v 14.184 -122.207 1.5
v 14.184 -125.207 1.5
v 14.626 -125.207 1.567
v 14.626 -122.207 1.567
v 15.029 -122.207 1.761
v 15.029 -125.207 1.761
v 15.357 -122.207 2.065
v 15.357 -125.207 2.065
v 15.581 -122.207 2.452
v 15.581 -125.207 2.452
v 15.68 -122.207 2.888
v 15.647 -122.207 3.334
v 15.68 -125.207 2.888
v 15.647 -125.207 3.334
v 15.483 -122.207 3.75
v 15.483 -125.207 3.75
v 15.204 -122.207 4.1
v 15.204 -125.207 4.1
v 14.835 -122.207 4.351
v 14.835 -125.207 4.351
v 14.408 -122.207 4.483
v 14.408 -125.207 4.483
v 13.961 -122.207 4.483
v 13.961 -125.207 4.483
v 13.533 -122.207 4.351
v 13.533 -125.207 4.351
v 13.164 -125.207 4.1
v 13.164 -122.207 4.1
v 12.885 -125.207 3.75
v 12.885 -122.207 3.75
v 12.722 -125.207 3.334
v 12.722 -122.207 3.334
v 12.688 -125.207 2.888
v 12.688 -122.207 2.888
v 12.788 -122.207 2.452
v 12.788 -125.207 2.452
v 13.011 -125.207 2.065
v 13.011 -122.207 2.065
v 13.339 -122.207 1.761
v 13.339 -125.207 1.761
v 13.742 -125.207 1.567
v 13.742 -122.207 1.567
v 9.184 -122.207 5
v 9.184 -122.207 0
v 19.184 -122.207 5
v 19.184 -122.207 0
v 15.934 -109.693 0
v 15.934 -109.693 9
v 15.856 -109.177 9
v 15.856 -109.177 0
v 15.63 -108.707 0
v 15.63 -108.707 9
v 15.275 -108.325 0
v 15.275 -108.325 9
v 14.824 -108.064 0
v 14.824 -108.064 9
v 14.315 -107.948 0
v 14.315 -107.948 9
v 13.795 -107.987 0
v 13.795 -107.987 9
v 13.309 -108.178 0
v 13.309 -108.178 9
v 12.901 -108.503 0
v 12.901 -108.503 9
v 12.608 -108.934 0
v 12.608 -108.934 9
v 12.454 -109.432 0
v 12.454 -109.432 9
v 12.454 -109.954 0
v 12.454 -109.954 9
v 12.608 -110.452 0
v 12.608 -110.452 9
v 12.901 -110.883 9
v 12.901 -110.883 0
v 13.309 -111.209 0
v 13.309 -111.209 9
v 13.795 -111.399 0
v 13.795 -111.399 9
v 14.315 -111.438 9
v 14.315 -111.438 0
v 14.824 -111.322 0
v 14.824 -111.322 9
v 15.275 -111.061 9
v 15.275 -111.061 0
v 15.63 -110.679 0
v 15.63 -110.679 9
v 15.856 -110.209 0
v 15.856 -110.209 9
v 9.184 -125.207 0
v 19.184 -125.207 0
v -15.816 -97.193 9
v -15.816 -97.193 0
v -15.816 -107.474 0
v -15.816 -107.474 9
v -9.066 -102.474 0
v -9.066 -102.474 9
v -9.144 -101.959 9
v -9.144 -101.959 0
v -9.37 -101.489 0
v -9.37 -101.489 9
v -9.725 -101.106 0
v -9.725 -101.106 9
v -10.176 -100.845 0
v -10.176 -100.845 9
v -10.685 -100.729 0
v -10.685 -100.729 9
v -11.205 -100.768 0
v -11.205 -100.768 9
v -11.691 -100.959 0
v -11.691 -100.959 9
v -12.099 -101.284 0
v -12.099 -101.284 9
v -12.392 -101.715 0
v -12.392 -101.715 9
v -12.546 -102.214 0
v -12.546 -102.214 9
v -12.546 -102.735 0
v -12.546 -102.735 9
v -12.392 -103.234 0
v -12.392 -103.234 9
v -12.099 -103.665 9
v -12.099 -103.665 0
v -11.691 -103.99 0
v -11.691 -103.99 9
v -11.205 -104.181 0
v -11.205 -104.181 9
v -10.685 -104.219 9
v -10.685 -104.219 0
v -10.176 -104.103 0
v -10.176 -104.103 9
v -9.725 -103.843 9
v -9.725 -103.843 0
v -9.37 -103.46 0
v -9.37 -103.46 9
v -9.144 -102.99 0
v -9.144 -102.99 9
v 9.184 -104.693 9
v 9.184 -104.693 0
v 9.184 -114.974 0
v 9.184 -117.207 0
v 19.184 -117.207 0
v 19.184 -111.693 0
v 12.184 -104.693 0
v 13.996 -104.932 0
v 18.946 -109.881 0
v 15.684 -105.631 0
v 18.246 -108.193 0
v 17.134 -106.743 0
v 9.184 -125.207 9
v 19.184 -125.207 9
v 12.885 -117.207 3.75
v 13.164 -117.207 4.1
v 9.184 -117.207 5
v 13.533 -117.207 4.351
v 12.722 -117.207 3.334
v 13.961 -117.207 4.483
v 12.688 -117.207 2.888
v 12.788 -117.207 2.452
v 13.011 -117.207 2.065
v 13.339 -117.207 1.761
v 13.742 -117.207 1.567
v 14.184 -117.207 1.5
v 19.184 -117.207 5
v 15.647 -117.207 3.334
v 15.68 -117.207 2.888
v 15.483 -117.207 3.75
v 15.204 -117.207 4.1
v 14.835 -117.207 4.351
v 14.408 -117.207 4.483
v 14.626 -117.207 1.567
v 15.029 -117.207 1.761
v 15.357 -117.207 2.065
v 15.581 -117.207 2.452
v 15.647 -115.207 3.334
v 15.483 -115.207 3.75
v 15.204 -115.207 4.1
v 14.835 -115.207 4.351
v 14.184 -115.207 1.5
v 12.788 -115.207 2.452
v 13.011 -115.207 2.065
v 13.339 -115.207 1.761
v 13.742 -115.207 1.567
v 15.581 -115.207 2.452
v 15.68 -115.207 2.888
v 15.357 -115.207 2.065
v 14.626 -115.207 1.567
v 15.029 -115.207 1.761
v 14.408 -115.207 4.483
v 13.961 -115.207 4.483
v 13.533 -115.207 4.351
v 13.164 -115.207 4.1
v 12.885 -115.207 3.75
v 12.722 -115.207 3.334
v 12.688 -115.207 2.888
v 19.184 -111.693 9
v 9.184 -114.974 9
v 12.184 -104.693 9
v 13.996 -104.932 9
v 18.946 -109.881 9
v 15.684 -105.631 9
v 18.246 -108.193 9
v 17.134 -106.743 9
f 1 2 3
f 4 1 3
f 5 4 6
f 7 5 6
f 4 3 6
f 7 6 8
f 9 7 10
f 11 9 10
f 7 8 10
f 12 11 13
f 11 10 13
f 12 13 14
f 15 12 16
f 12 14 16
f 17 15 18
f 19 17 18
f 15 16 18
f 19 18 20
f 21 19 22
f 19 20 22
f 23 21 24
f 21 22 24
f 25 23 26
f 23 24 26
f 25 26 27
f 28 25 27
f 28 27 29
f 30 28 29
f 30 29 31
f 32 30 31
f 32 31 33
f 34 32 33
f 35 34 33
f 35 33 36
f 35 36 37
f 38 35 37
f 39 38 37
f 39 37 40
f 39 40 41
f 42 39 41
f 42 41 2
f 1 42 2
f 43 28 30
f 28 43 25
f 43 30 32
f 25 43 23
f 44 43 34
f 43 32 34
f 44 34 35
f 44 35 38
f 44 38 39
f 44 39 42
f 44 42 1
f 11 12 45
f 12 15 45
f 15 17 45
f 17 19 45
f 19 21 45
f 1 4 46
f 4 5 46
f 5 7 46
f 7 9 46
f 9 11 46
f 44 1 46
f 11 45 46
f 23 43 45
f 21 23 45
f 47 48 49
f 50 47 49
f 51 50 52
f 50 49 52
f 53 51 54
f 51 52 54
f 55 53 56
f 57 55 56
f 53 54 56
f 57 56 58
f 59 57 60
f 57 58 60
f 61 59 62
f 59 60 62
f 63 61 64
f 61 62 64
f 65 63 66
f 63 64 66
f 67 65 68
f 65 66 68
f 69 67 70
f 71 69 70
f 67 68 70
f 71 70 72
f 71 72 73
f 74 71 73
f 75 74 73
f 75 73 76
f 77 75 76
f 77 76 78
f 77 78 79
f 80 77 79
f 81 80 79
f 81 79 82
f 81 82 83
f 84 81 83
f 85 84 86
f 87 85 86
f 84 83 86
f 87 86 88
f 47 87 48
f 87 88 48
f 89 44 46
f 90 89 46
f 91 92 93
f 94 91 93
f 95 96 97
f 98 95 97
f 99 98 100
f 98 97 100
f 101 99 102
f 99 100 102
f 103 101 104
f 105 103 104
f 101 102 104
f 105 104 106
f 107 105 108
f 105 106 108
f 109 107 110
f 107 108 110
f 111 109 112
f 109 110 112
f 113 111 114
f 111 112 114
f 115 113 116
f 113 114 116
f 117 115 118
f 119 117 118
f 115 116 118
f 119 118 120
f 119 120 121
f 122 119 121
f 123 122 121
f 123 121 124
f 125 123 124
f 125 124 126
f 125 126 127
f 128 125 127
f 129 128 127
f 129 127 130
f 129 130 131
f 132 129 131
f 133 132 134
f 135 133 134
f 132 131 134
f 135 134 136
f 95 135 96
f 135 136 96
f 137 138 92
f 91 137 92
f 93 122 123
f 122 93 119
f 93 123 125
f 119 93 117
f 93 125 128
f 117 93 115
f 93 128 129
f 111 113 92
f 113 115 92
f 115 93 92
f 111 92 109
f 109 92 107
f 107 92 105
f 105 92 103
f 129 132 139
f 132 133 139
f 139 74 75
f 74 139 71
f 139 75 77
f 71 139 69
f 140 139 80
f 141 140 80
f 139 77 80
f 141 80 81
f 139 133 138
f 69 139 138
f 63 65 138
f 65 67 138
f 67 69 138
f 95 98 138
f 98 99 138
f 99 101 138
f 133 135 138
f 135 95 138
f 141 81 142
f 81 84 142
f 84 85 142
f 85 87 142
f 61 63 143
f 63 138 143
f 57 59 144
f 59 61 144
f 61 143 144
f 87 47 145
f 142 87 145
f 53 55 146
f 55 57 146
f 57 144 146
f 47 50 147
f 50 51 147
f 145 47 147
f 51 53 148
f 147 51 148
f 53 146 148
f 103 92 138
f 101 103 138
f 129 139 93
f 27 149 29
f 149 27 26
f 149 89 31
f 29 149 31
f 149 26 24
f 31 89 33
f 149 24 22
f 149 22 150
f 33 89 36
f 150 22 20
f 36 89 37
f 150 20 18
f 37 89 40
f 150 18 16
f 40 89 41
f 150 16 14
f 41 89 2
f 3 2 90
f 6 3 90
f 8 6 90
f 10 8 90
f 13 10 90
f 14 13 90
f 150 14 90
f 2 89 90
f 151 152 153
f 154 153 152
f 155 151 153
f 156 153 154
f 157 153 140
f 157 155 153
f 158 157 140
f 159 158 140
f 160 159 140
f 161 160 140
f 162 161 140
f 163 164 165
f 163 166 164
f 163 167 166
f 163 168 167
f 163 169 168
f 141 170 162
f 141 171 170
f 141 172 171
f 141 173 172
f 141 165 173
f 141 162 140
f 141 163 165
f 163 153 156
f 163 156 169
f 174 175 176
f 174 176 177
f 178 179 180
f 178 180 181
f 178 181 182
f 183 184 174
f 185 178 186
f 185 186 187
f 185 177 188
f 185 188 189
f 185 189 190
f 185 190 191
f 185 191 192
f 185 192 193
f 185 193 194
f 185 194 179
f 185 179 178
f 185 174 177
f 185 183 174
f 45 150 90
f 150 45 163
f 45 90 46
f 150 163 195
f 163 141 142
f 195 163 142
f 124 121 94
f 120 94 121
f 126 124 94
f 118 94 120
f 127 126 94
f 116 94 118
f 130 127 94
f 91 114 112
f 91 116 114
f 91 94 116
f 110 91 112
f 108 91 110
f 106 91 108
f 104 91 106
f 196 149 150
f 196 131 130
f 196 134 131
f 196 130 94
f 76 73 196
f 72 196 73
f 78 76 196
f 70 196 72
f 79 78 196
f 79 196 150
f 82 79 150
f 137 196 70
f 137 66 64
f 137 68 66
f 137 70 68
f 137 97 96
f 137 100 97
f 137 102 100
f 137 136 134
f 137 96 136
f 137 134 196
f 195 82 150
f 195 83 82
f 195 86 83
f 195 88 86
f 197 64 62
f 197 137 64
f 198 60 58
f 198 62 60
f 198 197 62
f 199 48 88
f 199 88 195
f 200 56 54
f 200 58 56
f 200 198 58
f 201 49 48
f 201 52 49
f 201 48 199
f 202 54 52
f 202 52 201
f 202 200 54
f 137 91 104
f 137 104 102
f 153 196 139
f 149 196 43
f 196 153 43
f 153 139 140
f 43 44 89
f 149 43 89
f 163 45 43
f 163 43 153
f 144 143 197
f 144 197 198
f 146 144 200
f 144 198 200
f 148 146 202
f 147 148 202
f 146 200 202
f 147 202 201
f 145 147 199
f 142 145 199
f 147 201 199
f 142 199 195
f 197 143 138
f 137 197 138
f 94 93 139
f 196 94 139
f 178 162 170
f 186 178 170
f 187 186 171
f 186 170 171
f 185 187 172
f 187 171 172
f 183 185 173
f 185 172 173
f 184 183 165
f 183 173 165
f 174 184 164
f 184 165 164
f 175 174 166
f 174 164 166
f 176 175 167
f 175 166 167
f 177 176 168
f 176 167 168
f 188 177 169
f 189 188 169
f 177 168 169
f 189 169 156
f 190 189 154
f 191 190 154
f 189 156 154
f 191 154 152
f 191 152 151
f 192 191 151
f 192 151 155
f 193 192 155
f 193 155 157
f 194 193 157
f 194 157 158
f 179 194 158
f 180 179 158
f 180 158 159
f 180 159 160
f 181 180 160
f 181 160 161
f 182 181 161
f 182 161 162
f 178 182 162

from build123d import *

# Parameters (mm, degrees)
BOSS_EXTRUDE1_DEPTH = 9
SKETCH3_R           = 1.75
CUT_EXTRUDE1_DEPTH  = 9
SKETCH5_R           = 1.5
CUT_EXTRUDE2_DEPTH  = 10
SKETCH6_W           = 5
SKETCH6_H           = 5
CUT_EXTRUDE3_DEPTH  = 10
FILLET1_R           = 7


with BuildPart() as part:
    # Sketch2 → Boss-Extrude1 (new body)
    with BuildSketch(Plane.XY):
        Polygon((-15.81579683, -97.193157961), (-15.81579683, -107.474376779), (9.18420317, -114.974376779), (9.18420317, -125.206503808), (19.18420317, -125.206503808), (19.18420317, -114.974376779), (19.18420317, -104.693157961), (9.18420317, -104.693157961), align=None)
    extrude(amount=BOSS_EXTRUDE1_DEPTH)

    # Sketch3 → Cut-Extrude1 (cut)
    with BuildSketch(Plane.XY.offset(9)):
        with Locations((14.18420317, -109.693157961)):
            Circle(SKETCH3_R)
        with Locations((-10.81579683, -102.474376779)):
            Circle(SKETCH3_R)
    extrude(amount=-CUT_EXTRUDE1_DEPTH, mode=Mode.SUBTRACT)

    # Sketch5 → Cut-Extrude2 (cut)
    with BuildSketch(Plane.XZ.offset(125.206503808)):
        with Locations(Location((14.18420317, 3, 0), (0, 0, 270))):
            Circle(SKETCH5_R)
    extrude(amount=-CUT_EXTRUDE2_DEPTH, mode=Mode.SUBTRACT)

    # Sketch6 → Cut-Extrude3 (cut)
    with BuildSketch(Plane(origin=(19.18420317, 0, 0), x_dir=(0, 0, -1), z_dir=(1, 0, 0))):
        with Locations((-2.5, -119.706503808)):
            Rectangle(SKETCH6_W, SKETCH6_H)
    extrude(amount=-CUT_EXTRUDE3_DEPTH, mode=Mode.SUBTRACT)

    # Fillet1
    fillet1_edges = [part.edges().sort_by_distance(p)[0] for p in [
        (19.18420317, -104.693157961, 4.5),
    ]]
    fillet(fillet1_edges, radius=FILLET1_R)


solid = part.part
